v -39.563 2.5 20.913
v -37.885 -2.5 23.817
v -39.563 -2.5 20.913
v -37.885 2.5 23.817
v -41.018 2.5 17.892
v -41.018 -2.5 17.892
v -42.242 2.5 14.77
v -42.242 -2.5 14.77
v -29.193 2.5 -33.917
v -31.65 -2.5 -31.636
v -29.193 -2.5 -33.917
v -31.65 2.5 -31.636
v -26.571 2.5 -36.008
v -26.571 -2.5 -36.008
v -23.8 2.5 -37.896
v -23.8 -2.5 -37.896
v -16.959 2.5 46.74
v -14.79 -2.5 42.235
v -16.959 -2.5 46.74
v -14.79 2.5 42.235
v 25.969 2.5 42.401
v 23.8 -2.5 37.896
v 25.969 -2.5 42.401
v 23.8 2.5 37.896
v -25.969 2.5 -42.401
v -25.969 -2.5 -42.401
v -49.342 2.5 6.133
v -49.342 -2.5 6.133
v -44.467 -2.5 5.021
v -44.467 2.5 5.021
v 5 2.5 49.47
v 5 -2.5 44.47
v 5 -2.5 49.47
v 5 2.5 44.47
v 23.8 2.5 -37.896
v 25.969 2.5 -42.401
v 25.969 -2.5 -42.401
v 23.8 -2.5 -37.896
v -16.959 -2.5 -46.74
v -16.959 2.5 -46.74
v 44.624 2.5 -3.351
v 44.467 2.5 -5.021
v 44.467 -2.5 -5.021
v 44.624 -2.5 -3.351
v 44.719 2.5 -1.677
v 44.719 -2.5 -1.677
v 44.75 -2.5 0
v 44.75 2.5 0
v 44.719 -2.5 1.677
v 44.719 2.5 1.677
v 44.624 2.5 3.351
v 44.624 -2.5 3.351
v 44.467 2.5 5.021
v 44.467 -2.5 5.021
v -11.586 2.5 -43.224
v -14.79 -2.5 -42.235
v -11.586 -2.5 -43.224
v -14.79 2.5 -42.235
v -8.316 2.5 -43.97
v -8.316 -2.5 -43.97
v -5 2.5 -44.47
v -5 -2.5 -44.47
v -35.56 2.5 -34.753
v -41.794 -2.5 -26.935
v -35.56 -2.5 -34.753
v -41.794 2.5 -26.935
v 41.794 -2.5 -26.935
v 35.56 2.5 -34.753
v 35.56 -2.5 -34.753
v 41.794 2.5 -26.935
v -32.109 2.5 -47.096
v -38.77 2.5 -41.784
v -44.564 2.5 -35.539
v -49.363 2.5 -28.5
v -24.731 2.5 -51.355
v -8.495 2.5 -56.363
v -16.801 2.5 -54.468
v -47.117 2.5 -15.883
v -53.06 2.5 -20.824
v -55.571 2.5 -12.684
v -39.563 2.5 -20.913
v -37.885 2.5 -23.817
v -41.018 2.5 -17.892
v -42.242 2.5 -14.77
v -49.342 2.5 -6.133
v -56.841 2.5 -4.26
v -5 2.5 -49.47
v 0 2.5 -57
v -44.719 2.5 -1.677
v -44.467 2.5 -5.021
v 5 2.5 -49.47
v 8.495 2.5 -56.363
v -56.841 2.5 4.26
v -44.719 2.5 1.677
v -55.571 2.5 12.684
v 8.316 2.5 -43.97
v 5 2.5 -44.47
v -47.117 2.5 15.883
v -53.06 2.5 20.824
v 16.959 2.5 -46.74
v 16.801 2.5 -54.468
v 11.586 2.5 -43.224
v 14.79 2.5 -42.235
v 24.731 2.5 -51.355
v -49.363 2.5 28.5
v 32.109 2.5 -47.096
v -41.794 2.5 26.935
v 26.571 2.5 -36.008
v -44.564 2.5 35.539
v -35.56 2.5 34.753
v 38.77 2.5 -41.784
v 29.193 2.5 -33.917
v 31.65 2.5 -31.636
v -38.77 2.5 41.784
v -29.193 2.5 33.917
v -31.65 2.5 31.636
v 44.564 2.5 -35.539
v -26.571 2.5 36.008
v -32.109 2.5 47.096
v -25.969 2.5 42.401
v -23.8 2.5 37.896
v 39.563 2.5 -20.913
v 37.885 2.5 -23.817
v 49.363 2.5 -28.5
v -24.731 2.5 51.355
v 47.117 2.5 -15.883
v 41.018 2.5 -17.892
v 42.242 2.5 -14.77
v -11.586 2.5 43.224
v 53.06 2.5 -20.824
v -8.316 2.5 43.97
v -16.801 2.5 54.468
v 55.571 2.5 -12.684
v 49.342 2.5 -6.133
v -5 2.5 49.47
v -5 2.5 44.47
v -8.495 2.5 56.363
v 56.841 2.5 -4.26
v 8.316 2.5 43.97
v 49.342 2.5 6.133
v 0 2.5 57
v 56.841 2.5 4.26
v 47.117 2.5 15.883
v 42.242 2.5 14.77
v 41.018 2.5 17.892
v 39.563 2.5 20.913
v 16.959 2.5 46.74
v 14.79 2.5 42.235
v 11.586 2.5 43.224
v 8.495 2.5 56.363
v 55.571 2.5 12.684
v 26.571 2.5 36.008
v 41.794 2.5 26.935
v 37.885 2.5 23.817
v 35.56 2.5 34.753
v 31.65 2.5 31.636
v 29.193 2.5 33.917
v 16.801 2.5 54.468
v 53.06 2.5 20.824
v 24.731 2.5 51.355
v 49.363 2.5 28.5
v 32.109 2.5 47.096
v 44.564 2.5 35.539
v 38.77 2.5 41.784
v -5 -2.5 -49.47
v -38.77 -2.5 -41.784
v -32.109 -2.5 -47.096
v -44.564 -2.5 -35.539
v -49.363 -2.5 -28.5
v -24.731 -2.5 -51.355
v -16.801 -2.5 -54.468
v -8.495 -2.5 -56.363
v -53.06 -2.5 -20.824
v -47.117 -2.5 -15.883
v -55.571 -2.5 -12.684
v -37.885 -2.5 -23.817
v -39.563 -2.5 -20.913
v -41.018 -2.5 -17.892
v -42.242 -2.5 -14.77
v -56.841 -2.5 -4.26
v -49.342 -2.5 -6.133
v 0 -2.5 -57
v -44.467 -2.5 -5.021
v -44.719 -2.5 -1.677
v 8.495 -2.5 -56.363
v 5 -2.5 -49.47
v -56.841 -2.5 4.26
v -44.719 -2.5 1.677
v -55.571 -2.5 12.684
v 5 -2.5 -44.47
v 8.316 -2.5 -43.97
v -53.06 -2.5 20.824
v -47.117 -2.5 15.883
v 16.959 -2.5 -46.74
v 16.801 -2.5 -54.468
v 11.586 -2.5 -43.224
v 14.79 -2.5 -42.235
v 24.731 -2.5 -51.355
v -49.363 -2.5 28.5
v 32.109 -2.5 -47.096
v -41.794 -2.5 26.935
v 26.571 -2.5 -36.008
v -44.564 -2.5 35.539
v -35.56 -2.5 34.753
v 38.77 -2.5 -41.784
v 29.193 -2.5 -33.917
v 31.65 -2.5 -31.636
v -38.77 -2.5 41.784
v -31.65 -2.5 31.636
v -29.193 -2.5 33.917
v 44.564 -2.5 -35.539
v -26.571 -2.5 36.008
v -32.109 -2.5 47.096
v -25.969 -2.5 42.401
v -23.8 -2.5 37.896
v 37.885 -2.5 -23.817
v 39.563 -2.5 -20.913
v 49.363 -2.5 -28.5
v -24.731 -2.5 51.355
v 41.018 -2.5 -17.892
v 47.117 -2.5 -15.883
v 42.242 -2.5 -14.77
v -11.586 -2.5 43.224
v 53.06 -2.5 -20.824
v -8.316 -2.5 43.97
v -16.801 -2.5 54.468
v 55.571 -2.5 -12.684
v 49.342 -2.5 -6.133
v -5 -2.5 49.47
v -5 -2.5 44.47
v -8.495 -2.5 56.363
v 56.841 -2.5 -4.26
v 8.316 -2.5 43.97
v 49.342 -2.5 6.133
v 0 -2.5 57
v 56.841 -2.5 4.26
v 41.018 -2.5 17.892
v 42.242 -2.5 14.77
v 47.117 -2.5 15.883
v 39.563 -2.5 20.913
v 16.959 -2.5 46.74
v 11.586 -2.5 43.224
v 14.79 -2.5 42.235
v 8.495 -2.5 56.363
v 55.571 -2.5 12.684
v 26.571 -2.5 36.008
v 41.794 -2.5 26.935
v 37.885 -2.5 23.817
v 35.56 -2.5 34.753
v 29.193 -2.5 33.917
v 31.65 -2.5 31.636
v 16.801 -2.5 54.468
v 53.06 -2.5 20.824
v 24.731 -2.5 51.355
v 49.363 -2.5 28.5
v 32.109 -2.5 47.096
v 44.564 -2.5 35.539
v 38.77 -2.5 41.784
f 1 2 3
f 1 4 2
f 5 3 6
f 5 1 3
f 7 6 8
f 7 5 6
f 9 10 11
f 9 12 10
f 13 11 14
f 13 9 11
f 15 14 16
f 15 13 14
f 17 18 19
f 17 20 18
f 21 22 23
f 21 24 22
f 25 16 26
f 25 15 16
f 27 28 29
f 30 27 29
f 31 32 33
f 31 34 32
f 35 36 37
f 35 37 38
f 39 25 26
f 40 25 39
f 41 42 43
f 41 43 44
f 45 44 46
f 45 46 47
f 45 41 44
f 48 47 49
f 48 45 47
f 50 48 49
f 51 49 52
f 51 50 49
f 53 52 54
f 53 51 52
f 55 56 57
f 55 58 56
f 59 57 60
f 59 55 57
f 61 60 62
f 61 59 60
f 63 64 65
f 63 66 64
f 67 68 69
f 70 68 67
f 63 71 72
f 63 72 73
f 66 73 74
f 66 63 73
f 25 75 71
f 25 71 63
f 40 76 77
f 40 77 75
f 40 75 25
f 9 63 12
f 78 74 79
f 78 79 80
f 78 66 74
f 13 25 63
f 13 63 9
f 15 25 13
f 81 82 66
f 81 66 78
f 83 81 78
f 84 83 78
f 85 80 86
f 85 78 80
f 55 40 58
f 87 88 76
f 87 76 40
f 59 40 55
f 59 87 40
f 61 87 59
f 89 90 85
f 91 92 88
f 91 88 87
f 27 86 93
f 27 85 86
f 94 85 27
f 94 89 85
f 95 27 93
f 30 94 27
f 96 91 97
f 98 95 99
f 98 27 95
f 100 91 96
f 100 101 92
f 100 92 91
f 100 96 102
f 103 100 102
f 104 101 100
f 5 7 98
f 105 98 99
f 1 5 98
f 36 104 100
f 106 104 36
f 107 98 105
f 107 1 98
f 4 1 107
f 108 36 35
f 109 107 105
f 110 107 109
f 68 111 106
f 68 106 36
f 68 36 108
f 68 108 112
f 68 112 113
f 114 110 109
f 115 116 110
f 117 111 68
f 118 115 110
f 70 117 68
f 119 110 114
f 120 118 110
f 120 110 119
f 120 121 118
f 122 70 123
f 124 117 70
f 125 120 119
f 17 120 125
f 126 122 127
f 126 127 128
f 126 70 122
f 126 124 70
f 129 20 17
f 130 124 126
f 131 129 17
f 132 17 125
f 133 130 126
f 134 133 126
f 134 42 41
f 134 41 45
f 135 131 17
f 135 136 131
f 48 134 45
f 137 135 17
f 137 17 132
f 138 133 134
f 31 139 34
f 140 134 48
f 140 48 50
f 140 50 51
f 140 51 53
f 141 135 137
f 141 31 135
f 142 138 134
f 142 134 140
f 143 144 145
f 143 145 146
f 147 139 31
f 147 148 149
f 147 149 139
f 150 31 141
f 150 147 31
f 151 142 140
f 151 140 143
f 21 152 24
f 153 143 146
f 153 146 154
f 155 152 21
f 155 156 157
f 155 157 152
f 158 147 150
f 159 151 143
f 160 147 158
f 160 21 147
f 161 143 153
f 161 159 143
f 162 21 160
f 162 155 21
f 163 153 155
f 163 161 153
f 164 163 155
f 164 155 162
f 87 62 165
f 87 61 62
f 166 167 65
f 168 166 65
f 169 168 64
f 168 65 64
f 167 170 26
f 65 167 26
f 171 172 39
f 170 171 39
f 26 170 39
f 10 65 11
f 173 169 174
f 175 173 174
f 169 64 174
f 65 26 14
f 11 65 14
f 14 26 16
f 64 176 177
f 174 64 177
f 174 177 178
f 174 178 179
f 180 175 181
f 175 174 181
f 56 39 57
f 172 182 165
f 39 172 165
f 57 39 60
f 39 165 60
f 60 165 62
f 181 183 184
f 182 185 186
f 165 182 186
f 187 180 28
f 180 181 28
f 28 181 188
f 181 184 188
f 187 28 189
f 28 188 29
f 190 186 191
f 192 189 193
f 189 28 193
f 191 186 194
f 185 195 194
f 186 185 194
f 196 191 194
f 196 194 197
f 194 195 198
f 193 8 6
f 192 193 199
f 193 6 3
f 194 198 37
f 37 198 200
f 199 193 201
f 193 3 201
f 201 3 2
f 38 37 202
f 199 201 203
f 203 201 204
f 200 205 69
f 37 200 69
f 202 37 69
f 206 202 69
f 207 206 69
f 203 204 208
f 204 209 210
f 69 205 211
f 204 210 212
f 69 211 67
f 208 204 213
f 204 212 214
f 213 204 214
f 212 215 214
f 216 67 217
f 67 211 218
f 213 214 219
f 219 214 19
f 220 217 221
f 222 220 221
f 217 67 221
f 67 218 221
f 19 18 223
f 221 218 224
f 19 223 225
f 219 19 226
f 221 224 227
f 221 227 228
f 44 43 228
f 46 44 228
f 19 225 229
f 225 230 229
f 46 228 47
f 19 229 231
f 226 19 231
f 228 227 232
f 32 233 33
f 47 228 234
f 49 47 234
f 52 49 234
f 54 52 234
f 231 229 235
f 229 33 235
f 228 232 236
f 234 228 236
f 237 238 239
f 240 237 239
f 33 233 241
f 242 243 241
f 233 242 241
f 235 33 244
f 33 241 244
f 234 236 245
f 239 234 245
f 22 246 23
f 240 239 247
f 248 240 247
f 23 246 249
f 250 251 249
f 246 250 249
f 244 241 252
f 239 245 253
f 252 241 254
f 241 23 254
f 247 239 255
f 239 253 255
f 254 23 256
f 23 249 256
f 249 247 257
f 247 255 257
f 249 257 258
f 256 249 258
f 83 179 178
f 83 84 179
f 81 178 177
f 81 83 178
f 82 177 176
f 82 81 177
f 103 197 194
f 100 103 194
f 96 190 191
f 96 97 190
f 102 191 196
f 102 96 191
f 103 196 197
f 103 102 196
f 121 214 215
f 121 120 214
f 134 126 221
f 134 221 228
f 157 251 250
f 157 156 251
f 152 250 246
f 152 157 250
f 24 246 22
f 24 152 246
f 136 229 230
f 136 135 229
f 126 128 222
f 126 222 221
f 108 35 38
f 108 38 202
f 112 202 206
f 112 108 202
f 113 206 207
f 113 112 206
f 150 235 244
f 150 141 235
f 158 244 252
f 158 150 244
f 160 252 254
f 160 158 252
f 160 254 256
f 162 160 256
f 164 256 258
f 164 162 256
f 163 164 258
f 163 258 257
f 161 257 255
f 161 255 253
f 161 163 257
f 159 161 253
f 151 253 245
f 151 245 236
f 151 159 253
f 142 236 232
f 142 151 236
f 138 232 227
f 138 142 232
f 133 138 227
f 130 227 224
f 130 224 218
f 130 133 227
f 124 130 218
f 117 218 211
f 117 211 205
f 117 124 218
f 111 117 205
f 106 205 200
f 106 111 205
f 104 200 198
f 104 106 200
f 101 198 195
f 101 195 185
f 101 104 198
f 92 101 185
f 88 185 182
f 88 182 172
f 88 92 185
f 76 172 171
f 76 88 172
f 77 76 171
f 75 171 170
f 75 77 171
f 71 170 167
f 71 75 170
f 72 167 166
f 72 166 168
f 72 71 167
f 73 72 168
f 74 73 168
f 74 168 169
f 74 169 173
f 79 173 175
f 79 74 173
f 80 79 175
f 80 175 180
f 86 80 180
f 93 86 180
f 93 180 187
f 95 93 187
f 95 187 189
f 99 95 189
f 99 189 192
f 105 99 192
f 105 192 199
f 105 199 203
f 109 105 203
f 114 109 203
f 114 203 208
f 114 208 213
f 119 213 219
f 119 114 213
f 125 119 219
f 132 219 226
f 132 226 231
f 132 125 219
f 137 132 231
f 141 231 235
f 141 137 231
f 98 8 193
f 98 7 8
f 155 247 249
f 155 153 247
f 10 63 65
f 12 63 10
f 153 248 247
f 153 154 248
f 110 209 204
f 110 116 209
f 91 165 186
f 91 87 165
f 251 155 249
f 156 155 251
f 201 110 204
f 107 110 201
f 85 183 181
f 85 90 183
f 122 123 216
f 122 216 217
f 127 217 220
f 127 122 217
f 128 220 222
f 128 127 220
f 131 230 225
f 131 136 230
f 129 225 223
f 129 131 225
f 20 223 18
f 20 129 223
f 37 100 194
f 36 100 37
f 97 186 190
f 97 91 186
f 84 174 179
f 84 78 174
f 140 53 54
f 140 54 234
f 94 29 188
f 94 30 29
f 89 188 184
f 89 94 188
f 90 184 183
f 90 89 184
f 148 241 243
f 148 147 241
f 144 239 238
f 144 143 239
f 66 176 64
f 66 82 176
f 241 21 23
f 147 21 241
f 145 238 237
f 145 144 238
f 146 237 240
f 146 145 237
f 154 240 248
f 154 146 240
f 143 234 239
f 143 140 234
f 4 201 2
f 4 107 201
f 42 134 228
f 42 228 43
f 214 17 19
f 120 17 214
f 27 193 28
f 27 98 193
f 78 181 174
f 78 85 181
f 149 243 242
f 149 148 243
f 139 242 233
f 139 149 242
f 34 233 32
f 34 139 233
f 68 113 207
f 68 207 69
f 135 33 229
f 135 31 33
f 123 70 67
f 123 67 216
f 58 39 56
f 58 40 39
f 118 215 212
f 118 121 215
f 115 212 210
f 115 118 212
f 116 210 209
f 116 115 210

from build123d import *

# Parameters (mm, degrees)
SKETCH1_R           = 57
BOSS_EXTRUDE1_DEPTH = 2.5


with BuildPart() as part:
    # Sketch1 → Boss-Extrude1 (new, symmetric)
    with BuildSketch(Plane(origin=(0, 0, 0), x_dir=(1, 0, 0), z_dir=(0, 1, 0))):
        with Locations(Location((0, 0, 0), (0, 0, 270))):
            Circle(SKETCH1_R)
        with BuildLine():
            Line((14.789875777, 42.235317857), (16.959294472, 46.740162197))
            Line((16.959294472, 46.740162197), (25.968983151, 42.401324806))
            Line((25.968983151, 42.401324806), (23.799564456, 37.896480466))
            ThreePointArc((23.799564456, 37.896480466), (27.901168633, 34.98695884), (31.65043527, 31.635619912))
            Line((31.65043527, 31.635619912), (35.559592682, 34.753068922))
            Line((35.559592682, 34.753068922), (41.7944907, 26.934754097))
            Line((41.7944907, 26.934754097), (37.885333288, 23.817305088))
            ThreePointArc((37.885333288, 23.817305088), (40.318356839, 19.416297326), (42.24223789, 14.770099458))
            Line((42.24223789, 14.770099458), (47.116877451, 15.882704128))
            Line((47.116877451, 15.882704128), (49.342086791, 6.133425006))
            Line((49.342086791, 6.133425006), (44.46744723, 5.020820337))
            ThreePointArc((44.46744723, 5.020820337), (44.679305968, 2.514382276), (44.75, 0))
            ThreePointArc((44.75, 0), (44.679305968, -2.514382276), (44.46744723, -5.020820337))
            Line((44.46744723, -5.020820337), (49.342086791, -6.133425006))
            Line((49.342086791, -6.133425006), (47.116877451, -15.882704128))
            Line((47.116877451, -15.882704128), (42.24223789, -14.770099458))
            ThreePointArc((42.24223789, -14.770099458), (40.318356839, -19.416297326), (37.885333288, -23.817305088))
            Line((37.885333288, -23.817305088), (41.7944907, -26.934754097))
            Line((41.7944907, -26.934754097), (35.559592682, -34.753068922))
            Line((35.559592682, -34.753068922), (31.65043527, -31.635619912))
            ThreePointArc((31.65043527, -31.635619912), (27.901168633, -34.98695884), (23.799564456, -37.896480466))
            Line((23.799564456, -37.896480466), (25.968983151, -42.401324806))
            Line((25.968983151, -42.401324806), (16.959294472, -46.740162197))
            Line((16.959294472, -46.740162197), (14.789875777, -42.235317857))
            ThreePointArc((14.789875777, -42.235317857), (9.957811795, -43.62802407), (5, -44.469793118))
            Line((5, -44.469793118), (5, -49.469793118))
            Line((5, -49.469793118), (-5, -49.469793118))
            Line((-5, -49.469793118), (-5, -44.469793118))
            ThreePointArc((-5, -44.469793118), (-9.957811795, -43.62802407), (-14.789875777, -42.235317857))
            Line((-14.789875777, -42.235317857), (-16.959294472, -46.740162197))
            Line((-16.959294472, -46.740162197), (-25.968983151, -42.401324806))
            Line((-25.968983151, -42.401324806), (-23.799564456, -37.896480466))
            ThreePointArc((-23.799564456, -37.896480466), (-27.901168633, -34.98695884), (-31.65043527, -31.635619912))
            Line((-31.65043527, -31.635619912), (-35.559592682, -34.753068922))
            Line((-35.559592682, -34.753068922), (-41.7944907, -26.934754097))
            Line((-41.7944907, -26.934754097), (-37.885333288, -23.817305088))
            ThreePointArc((-37.885333288, -23.817305088), (-40.318356839, -19.416297326), (-42.24223789, -14.770099458))
            Line((-42.24223789, -14.770099458), (-47.116877451, -15.882704128))
            Line((-47.116877451, -15.882704128), (-49.342086791, -6.133425006))
            Line((-49.342086791, -6.133425006), (-44.46744723, -5.020820337))
            ThreePointArc((-44.46744723, -5.020820337), (-44.75, 0), (-44.46744723, 5.020820337))
            Line((-44.46744723, 5.020820337), (-49.342086791, 6.133425006))
            Line((-49.342086791, 6.133425006), (-47.116877451, 15.882704128))
            Line((-47.116877451, 15.882704128), (-42.24223789, 14.770099458))
            ThreePointArc((-42.24223789, 14.770099458), (-40.318356839, 19.416297326), (-37.885333288, 23.817305088))
            Line((-37.885333288, 23.817305088), (-41.7944907, 26.934754097))
            Line((-41.7944907, 26.934754097), (-35.559592682, 34.753068922))
            Line((-35.559592682, 34.753068922), (-31.65043527, 31.635619912))
            ThreePointArc((-31.65043527, 31.635619912), (-27.901168633, 34.98695884), (-23.799564456, 37.896480466))
            Line((-23.799564456, 37.896480466), (-25.968983151, 42.401324806))
            Line((-25.968983151, 42.401324806), (-16.959294472, 46.740162197))
            Line((-16.959294472, 46.740162197), (-14.789875777, 42.235317857))
            ThreePointArc((-14.789875777, 42.235317857), (-9.957811795, 43.62802407), (-5, 44.469793118))
            Line((-5, 44.469793118), (-5, 49.469793118))
            Line((-5, 49.469793118), (5, 49.469793118))
            Line((5, 49.469793118), (5, 44.469793118))
            ThreePointArc((5, 44.469793118), (9.957811795, 43.62802407), (14.789875777, 42.235317857))
        make_face(mode=Mode.SUBTRACT)
    extrude(amount=BOSS_EXTRUDE1_DEPTH, both=True)


solid = part.part
